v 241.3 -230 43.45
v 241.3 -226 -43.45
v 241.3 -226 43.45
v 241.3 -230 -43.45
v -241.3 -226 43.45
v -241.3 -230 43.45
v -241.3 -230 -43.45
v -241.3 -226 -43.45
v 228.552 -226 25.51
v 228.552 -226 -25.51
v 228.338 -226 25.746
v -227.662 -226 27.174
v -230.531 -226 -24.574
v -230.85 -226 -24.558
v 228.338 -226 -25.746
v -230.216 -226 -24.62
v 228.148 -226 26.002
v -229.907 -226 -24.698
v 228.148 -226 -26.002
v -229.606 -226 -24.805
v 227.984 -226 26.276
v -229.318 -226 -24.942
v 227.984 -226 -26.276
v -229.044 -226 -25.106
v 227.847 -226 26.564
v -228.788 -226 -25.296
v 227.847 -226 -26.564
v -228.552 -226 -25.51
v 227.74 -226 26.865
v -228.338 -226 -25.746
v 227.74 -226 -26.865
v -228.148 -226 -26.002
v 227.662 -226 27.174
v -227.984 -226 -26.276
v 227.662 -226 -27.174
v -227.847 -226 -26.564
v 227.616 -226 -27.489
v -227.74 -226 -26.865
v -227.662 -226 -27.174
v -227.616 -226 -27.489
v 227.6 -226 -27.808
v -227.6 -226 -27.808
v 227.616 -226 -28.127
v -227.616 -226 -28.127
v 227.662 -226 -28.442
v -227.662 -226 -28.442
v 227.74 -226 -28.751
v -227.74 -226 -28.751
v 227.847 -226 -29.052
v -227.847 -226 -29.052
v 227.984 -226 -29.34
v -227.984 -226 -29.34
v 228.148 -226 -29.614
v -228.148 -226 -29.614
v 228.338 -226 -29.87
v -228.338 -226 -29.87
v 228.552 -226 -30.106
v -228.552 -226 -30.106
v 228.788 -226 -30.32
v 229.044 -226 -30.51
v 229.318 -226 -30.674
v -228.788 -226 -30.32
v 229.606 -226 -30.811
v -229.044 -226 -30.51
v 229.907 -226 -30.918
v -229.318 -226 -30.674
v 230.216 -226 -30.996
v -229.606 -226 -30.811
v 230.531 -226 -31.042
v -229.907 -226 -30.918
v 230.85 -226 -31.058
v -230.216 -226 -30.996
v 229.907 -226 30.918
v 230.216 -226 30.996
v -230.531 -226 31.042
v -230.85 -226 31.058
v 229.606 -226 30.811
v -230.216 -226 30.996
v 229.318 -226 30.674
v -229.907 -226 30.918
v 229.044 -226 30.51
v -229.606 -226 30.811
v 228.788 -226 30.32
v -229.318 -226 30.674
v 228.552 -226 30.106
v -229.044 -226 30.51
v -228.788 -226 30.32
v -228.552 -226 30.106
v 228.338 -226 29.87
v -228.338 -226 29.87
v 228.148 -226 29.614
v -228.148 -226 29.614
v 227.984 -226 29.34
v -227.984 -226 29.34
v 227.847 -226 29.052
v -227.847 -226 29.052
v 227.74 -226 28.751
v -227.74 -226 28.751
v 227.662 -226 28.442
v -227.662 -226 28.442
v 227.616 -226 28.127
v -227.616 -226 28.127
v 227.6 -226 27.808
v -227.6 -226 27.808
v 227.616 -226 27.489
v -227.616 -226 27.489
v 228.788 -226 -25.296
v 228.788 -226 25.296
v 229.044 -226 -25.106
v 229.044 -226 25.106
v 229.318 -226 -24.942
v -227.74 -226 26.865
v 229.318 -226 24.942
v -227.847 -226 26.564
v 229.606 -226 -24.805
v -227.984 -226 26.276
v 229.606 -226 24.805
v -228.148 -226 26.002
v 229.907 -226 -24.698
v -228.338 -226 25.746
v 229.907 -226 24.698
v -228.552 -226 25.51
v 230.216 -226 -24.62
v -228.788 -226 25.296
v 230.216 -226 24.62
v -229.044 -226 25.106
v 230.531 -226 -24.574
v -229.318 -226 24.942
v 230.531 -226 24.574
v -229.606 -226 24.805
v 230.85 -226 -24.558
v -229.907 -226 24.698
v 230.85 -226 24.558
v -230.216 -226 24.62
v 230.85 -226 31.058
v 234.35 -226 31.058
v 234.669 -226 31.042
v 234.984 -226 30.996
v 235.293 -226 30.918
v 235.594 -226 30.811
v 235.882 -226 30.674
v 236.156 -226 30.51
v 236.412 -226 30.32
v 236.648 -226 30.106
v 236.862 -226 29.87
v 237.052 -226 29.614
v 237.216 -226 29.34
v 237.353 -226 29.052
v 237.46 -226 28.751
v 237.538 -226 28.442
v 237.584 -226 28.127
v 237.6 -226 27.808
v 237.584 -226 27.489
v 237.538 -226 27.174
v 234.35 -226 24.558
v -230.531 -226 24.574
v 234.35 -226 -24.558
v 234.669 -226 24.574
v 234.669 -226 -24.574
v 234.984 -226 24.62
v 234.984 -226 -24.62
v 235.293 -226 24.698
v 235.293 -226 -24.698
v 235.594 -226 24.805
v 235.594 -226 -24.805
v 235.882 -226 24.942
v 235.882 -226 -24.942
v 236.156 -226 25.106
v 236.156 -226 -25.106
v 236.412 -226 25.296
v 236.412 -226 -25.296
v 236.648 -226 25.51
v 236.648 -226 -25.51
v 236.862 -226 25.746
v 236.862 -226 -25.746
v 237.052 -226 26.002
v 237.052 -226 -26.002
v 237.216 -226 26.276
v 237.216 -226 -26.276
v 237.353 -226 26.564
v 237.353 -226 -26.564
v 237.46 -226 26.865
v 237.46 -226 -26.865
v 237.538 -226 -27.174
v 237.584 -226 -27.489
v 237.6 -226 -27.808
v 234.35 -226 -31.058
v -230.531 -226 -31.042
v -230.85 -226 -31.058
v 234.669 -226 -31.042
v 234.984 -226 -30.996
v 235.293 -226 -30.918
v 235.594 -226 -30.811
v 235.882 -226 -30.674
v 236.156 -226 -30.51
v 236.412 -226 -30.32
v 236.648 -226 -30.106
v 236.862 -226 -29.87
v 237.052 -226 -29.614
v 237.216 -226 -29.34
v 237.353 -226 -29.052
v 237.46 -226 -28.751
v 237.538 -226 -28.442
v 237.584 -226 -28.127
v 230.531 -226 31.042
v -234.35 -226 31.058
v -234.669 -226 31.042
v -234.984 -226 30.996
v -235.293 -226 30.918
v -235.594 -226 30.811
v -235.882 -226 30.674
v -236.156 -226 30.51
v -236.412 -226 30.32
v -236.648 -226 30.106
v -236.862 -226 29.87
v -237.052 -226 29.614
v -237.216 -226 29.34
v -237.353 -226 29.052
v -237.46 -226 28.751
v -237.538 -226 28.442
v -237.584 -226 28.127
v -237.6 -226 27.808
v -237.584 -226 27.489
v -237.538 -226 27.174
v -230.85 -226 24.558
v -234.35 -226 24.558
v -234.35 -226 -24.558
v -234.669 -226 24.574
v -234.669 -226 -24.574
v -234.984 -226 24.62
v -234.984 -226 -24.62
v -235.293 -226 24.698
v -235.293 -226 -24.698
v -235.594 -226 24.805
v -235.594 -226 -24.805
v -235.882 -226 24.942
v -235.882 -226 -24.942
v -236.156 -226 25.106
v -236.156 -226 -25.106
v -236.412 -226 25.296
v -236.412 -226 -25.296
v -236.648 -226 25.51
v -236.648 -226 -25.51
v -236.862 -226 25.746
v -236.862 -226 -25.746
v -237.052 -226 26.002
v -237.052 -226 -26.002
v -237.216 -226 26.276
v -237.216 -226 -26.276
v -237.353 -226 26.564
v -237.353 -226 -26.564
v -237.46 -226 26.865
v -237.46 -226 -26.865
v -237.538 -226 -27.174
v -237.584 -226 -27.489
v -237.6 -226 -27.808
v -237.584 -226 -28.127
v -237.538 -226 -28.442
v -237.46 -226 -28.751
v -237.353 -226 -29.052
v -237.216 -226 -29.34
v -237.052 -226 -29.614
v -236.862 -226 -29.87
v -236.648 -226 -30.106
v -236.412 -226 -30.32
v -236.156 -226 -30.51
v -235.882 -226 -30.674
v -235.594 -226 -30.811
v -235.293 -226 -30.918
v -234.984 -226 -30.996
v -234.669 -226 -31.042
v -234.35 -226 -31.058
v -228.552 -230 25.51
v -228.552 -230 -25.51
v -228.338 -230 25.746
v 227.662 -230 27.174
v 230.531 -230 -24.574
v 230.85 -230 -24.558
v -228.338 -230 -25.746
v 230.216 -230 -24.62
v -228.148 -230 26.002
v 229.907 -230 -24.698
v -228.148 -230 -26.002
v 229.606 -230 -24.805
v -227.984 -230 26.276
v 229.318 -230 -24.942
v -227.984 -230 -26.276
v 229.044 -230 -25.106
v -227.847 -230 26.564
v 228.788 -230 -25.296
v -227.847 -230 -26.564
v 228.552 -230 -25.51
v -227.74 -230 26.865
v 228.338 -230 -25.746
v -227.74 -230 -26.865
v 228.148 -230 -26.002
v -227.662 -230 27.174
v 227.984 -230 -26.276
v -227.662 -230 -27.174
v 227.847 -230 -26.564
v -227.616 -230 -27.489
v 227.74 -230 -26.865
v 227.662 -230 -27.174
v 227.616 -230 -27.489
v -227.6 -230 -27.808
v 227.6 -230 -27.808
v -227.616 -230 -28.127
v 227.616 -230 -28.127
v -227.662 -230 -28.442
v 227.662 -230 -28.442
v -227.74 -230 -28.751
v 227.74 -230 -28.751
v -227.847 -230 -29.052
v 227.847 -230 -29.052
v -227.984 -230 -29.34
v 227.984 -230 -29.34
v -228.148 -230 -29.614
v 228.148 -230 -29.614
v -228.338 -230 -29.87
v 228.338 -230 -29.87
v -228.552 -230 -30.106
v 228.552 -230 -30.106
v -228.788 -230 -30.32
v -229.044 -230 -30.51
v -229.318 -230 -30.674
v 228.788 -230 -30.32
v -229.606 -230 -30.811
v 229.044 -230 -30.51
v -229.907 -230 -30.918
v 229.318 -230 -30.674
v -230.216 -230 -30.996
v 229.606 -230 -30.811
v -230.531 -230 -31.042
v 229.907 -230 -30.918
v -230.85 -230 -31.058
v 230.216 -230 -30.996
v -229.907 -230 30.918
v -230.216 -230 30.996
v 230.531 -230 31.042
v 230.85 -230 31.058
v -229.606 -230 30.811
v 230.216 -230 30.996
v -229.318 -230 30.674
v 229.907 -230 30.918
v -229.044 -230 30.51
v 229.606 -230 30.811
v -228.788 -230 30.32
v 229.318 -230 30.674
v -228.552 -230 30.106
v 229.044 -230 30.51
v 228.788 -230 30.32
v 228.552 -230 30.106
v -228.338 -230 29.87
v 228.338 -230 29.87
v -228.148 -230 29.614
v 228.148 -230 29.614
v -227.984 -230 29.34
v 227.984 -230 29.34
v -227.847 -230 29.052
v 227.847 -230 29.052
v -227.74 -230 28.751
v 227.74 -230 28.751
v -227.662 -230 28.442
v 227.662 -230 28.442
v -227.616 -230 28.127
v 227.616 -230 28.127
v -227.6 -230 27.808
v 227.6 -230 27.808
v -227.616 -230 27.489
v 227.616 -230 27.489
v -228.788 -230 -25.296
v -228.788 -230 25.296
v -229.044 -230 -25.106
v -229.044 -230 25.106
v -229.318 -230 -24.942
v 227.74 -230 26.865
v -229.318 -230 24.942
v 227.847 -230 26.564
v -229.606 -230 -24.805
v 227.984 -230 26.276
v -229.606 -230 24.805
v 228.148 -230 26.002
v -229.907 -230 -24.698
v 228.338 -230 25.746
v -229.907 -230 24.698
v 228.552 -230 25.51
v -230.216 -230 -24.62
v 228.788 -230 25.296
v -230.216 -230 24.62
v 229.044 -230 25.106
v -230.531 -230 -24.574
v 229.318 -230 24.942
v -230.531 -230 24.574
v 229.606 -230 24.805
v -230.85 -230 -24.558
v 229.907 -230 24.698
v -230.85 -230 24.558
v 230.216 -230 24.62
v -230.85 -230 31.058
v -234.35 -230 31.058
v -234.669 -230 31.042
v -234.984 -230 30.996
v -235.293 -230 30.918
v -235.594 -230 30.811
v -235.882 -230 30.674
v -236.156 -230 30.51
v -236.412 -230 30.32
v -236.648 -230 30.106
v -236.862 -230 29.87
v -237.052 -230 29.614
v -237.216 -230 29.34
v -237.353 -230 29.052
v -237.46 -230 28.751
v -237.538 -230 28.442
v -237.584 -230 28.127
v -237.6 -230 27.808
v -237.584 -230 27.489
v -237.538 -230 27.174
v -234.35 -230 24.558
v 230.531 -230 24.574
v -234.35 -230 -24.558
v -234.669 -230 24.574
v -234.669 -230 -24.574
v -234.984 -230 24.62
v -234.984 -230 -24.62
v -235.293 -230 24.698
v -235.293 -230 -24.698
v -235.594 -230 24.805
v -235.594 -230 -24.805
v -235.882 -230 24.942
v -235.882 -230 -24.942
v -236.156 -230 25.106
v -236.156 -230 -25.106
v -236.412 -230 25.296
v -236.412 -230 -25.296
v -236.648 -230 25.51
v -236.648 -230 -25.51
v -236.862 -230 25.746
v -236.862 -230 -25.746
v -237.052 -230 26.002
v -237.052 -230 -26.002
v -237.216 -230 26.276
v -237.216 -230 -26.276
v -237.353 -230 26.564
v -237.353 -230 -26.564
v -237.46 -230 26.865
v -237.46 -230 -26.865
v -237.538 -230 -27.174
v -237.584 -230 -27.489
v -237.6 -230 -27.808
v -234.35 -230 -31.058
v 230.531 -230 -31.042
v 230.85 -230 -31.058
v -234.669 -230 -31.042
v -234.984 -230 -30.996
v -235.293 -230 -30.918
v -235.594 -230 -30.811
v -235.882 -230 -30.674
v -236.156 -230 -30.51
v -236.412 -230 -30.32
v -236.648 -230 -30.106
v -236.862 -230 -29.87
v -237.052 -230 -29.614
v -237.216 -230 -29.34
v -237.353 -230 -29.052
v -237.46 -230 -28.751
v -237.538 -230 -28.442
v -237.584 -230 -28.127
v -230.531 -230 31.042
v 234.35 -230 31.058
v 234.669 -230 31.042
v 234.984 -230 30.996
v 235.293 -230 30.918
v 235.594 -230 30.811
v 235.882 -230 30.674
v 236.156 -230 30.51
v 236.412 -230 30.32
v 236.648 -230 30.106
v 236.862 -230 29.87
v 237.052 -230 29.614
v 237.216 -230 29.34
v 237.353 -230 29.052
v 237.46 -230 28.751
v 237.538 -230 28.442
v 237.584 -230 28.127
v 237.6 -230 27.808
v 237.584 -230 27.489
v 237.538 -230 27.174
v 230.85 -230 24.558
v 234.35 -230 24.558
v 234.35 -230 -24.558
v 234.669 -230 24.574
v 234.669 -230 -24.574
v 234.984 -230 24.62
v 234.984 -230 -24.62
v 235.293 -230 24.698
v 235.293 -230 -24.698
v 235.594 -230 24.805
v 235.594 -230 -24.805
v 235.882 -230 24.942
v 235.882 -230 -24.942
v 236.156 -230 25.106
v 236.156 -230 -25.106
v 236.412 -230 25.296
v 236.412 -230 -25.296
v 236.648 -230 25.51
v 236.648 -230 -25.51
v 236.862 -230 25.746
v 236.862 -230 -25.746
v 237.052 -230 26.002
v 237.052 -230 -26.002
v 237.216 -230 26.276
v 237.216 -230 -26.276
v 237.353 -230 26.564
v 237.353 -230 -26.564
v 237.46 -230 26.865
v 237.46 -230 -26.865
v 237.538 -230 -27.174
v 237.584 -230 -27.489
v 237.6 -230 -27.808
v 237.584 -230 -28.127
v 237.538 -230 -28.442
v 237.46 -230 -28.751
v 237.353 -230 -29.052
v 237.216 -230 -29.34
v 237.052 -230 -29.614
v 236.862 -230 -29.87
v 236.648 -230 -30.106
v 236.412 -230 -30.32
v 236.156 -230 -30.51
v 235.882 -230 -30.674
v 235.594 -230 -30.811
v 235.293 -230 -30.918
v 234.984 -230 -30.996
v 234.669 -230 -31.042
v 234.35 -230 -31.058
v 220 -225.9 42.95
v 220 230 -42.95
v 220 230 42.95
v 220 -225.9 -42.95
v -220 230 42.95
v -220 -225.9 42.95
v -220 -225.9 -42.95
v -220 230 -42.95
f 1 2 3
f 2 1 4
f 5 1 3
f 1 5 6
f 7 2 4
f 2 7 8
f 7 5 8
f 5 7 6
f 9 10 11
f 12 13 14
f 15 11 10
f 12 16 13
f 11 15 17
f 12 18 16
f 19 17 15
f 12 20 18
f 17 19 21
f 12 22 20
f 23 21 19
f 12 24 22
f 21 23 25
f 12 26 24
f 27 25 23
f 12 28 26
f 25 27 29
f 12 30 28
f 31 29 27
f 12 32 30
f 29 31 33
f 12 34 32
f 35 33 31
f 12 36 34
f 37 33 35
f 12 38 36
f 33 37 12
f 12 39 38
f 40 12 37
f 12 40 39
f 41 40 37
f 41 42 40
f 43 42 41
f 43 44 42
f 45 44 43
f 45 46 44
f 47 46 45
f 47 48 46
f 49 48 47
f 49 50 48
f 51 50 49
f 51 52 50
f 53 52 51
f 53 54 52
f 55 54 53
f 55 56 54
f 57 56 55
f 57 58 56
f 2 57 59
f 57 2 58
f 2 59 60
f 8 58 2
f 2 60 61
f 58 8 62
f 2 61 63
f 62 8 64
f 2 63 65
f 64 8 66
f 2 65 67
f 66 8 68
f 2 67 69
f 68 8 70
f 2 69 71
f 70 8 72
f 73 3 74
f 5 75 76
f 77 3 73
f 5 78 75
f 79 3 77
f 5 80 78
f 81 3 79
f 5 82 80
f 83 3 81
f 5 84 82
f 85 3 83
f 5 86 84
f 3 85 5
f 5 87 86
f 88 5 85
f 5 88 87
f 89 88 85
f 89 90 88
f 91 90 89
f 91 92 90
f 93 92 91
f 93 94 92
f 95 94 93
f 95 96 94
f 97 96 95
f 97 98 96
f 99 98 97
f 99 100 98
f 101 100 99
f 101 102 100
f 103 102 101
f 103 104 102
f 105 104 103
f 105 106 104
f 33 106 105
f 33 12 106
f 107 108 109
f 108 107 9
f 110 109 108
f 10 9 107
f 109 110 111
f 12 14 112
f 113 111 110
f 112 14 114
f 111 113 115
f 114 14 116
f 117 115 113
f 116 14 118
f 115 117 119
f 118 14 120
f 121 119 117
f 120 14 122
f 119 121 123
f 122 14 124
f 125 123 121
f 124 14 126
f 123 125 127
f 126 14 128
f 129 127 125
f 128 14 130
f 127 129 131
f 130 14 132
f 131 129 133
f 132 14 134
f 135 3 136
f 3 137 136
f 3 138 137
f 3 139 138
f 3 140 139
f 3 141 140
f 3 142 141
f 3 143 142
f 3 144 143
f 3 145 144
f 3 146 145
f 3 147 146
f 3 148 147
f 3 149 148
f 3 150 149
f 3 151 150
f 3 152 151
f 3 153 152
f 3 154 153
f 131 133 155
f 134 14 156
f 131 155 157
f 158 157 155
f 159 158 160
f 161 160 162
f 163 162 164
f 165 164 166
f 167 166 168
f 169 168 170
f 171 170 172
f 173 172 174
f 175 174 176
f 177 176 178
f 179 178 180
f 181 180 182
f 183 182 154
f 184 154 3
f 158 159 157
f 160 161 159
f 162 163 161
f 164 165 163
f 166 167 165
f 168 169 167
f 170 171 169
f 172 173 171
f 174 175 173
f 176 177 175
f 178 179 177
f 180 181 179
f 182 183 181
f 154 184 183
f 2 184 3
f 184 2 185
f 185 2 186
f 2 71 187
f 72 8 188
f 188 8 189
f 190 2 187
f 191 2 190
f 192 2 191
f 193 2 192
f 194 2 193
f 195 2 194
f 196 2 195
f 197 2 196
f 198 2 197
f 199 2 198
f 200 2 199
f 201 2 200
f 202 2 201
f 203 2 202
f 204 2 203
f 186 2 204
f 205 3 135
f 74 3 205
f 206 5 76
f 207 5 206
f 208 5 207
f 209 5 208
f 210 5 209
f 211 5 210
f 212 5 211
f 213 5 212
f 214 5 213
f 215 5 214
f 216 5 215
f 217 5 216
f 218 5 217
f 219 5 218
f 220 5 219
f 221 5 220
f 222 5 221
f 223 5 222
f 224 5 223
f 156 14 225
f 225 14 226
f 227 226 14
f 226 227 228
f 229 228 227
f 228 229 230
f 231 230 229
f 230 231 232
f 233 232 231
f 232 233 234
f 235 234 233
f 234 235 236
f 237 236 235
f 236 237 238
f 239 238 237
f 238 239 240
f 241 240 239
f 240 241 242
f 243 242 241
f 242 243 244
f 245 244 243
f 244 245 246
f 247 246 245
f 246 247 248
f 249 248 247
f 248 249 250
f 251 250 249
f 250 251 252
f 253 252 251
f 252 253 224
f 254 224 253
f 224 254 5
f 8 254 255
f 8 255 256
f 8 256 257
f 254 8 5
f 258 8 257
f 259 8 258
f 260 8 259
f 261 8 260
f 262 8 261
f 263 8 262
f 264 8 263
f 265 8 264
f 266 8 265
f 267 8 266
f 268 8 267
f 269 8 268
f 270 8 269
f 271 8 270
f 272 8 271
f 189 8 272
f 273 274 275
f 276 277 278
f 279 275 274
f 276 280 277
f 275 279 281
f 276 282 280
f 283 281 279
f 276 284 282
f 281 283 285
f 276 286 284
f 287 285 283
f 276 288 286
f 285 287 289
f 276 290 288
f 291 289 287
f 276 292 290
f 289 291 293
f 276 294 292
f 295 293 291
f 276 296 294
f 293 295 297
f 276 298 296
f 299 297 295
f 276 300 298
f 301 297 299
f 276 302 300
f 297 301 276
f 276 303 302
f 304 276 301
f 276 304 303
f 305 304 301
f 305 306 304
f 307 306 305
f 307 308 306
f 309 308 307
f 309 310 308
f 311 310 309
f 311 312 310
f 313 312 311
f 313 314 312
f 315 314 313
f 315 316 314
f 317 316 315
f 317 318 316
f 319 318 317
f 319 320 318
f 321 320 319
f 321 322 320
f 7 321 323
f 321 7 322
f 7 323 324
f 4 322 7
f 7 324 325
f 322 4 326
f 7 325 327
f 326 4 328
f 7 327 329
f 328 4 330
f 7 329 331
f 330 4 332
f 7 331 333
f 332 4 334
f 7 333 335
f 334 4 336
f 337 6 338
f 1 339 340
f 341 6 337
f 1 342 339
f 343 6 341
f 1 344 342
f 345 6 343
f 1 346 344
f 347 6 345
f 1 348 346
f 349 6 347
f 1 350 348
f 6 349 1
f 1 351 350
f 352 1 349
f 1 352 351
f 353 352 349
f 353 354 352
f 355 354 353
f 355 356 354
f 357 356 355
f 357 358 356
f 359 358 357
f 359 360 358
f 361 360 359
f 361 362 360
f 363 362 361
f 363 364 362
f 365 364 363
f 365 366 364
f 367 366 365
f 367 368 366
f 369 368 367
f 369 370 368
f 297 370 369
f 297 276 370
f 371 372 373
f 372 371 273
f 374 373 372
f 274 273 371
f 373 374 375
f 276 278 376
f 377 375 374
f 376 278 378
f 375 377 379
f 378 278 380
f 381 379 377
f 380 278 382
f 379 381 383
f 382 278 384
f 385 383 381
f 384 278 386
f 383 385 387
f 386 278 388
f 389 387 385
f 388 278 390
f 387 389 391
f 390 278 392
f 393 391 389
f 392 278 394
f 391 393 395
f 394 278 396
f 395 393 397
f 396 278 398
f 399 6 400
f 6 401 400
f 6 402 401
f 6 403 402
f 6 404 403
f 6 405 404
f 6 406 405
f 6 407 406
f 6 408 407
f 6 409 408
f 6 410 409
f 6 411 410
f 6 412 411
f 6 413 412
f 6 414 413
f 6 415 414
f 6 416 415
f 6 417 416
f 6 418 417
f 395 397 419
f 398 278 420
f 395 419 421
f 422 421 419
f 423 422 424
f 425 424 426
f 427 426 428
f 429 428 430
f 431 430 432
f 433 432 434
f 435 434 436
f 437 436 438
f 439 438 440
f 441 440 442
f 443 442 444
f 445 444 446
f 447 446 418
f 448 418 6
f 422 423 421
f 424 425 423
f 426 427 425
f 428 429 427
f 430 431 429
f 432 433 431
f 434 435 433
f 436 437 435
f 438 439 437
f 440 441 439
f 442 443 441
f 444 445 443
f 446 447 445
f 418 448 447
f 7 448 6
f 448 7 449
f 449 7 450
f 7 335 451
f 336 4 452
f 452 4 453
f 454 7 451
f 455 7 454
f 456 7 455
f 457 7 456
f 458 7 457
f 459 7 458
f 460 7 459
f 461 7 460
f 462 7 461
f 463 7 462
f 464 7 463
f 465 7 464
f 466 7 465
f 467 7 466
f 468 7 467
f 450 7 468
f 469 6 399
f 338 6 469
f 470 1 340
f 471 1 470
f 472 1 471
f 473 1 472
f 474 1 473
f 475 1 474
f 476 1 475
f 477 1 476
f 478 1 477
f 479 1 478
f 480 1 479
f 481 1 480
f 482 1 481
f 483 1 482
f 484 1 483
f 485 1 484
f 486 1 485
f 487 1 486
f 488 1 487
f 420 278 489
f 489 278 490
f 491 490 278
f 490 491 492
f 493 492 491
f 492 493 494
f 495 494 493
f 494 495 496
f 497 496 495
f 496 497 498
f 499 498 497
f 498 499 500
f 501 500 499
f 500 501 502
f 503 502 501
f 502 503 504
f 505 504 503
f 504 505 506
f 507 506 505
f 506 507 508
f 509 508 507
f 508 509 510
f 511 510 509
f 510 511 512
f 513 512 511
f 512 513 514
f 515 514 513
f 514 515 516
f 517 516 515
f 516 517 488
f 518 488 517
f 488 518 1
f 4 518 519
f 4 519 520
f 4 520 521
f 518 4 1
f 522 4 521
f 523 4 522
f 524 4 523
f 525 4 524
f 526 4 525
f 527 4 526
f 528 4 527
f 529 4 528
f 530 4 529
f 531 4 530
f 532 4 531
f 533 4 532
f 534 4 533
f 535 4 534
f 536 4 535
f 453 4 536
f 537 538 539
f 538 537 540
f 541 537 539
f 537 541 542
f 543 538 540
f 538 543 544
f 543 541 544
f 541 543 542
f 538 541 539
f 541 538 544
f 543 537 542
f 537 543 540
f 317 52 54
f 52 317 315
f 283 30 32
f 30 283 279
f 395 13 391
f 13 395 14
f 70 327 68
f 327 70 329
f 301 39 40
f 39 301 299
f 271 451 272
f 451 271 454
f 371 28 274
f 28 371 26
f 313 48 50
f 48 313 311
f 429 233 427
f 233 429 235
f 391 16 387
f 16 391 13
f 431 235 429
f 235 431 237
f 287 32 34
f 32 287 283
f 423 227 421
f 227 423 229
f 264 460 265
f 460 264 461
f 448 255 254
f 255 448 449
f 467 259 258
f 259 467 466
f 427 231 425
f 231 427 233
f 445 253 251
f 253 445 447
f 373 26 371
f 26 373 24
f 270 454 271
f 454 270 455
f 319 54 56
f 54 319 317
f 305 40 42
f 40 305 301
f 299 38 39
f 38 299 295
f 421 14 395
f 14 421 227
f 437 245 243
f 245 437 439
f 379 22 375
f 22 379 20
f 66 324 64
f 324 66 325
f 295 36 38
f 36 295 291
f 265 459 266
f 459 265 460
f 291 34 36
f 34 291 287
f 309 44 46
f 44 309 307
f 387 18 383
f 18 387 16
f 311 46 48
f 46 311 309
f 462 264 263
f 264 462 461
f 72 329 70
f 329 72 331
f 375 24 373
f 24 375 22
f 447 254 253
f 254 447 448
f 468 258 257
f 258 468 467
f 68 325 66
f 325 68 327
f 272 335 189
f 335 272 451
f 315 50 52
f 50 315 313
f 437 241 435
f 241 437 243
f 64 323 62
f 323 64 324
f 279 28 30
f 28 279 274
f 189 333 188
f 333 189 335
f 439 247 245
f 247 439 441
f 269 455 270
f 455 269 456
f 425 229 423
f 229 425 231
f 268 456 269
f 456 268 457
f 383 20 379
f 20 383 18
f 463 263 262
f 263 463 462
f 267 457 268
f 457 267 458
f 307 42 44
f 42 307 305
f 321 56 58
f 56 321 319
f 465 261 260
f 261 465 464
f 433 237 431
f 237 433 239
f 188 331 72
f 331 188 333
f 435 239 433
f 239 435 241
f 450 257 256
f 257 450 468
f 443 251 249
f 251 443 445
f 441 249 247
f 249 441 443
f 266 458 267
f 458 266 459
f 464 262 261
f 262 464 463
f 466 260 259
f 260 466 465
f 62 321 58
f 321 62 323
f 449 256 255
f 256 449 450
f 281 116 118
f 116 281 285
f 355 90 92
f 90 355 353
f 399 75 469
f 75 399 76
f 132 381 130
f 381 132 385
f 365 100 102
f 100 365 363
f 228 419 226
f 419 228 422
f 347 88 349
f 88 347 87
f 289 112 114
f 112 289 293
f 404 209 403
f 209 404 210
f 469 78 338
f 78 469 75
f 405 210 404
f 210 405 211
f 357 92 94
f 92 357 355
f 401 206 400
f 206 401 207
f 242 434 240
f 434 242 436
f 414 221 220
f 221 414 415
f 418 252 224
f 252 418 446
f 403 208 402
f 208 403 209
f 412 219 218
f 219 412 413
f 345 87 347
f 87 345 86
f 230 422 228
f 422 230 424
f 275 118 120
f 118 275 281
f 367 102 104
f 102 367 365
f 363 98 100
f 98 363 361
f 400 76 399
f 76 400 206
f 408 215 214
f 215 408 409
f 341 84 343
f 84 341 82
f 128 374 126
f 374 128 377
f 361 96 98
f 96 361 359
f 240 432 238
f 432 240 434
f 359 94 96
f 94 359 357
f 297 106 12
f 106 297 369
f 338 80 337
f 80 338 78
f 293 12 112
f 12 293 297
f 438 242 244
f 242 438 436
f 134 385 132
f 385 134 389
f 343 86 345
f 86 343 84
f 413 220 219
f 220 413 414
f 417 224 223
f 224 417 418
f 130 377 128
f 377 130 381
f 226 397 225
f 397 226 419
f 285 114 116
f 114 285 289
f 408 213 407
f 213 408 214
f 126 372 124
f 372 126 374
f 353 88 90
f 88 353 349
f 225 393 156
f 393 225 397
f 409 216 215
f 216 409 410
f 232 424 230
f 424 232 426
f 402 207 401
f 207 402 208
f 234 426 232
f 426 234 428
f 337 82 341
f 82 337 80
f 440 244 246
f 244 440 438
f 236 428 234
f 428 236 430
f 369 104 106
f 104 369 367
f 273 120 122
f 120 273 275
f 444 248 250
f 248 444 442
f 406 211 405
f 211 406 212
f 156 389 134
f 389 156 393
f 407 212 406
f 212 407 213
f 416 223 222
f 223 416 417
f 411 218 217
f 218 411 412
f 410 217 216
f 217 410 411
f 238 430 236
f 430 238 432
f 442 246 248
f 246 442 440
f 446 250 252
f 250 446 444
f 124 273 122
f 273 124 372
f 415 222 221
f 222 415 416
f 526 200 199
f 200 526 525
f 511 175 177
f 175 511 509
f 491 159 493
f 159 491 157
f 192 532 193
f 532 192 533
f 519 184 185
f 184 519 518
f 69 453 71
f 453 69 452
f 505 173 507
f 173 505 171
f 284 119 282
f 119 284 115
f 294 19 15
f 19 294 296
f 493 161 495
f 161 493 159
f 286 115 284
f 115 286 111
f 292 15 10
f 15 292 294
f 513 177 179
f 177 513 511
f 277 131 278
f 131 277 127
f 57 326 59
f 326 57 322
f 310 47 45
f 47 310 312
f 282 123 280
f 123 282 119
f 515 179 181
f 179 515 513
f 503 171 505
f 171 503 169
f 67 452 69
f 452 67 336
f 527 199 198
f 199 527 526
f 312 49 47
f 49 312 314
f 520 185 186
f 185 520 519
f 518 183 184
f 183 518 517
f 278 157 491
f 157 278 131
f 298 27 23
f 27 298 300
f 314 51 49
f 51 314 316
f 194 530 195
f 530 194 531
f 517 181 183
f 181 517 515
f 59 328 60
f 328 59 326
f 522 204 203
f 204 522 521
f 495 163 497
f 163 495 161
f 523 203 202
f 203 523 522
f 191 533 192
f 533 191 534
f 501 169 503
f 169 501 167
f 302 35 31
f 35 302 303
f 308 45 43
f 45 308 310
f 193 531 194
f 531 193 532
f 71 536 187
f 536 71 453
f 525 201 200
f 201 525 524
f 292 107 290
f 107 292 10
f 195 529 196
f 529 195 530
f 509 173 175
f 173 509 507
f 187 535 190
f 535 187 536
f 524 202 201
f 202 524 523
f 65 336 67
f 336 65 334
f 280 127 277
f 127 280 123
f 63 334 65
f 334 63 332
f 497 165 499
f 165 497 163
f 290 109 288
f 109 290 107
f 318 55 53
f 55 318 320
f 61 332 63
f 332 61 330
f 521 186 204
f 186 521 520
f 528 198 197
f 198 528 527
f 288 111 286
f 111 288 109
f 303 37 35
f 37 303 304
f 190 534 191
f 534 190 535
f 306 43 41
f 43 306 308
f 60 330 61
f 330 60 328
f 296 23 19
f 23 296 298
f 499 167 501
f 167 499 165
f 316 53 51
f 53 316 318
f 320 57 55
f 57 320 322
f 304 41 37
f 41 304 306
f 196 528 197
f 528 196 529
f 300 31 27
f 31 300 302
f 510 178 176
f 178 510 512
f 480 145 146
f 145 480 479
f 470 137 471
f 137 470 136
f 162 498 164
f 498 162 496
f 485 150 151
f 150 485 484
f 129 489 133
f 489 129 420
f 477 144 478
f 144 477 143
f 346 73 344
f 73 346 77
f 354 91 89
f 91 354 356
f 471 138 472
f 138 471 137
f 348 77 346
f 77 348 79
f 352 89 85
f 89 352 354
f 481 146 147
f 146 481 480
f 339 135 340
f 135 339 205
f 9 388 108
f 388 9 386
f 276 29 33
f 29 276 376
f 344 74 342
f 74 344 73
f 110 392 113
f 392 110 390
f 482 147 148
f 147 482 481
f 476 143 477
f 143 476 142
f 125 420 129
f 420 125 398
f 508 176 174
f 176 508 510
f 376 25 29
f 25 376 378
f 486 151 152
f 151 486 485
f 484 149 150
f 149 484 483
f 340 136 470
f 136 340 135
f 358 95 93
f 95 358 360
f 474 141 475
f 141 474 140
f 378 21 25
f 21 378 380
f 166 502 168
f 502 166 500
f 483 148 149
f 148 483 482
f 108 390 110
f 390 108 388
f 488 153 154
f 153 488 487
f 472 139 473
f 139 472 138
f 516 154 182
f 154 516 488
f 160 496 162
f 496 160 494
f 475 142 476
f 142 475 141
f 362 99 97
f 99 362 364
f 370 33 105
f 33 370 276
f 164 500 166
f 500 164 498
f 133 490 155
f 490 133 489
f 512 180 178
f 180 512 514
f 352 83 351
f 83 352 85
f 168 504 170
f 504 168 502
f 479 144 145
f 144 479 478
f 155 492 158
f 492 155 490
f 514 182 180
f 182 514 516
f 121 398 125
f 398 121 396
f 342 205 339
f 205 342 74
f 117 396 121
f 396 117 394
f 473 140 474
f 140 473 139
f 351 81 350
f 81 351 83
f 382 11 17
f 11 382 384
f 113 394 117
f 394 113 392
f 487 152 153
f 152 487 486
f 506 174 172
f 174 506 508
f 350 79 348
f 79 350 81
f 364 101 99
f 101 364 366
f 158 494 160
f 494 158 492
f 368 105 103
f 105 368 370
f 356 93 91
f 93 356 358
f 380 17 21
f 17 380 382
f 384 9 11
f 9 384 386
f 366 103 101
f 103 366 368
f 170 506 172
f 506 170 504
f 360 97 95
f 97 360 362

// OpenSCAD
// ============================================================================
// Atom Lithography Machine — Parametric OpenSCAD Module (S6.4-02)
// ============================================================================
// part_id           : S6.4-02
// parent_bom_id     : S6.4
// subsystem         : S6
// part_name         : Genis-bantli I/Q modulatorler, hizli anahtarlar ve oda-sicakligi surucu amp.
// material          : Al 6061
// temp_stage        : 300 K (kabin)
// vacuum_grade      : Atmosfer
// tolerance         : ±0.2 dB
// computed_mass_kg  : 9.19863
// envelope_mm       : 482.600 x 472.050 x 86.900
// design_maturity   : M0_M1_DETAILED_CAD_DESIGN_ONLY
// no_lab_measurement: true
// iec61508_certified: false
// semi_s2_certified : false
// Units: millimeters (mm)
// ============================================================================

$fn = 64;

// Nominal bounding envelope parameters (mm)
bbox_x = 482.6000;
bbox_y = 472.0500;
bbox_z = 86.9000;

// Part-specific parametric dimensions
rack_u = 2;
qty_sets = 4;
if_bw_mhz = 200.0;

// Interface / port parameters (mm)

module part_S6_4_02() {
  difference() {
    union() {
      // 19" EIA-310 front bezel panel
      translate([0.000, -228.000, 0.000]) cube([482.600, 4.000, 86.900], center=true);
      // Hollow EMI shielded chassis body
      translate([0.000, 2.050, 0.000]) cube([440.000, 455.900, 85.900], center=true);
    }
    // EIA-310 rack ear slot
    translate([-232.600, -228.000, -27.808]) rotate([90.000, 0.000, 0.000]) {
      hull() {
        translate([-1.750, 0, 0]) cylinder(d=6.500, h=6.000, center=true);
        translate([1.750, 0, 0]) cylinder(d=6.500, h=6.000, center=true);
      }
    }
    // EIA-310 rack ear slot
    translate([-232.600, -228.000, 27.808]) rotate([90.000, 0.000, 0.000]) {
      hull() {
        translate([-1.750, 0, 0]) cylinder(d=6.500, h=6.000, center=true);
        translate([1.750, 0, 0]) cylinder(d=6.500, h=6.000, center=true);
      }
    }
    // EIA-310 rack ear slot
    translate([232.600, -228.000, -27.808]) rotate([90.000, 0.000, 0.000]) {
      hull() {
        translate([-1.750, 0, 0]) cylinder(d=6.500, h=6.000, center=true);
        translate([1.750, 0, 0]) cylinder(d=6.500, h=6.000, center=true);
      }
    }
    // EIA-310 rack ear slot
    translate([232.600, -228.000, 27.808]) rotate([90.000, 0.000, 0.000]) {
      hull() {
        translate([-1.750, 0, 0]) cylinder(d=6.500, h=6.000, center=true);
        translate([1.750, 0, 0]) cylinder(d=6.500, h=6.000, center=true);
      }
    }
  }
}

// World assembly mounting transform (global machine frame, mm / deg):
// translate([2100.000, 0.000, 845.650]) rotate([0.000, 0.000, 0.000]) part_S6_4_02();

part_S6_4_02();
